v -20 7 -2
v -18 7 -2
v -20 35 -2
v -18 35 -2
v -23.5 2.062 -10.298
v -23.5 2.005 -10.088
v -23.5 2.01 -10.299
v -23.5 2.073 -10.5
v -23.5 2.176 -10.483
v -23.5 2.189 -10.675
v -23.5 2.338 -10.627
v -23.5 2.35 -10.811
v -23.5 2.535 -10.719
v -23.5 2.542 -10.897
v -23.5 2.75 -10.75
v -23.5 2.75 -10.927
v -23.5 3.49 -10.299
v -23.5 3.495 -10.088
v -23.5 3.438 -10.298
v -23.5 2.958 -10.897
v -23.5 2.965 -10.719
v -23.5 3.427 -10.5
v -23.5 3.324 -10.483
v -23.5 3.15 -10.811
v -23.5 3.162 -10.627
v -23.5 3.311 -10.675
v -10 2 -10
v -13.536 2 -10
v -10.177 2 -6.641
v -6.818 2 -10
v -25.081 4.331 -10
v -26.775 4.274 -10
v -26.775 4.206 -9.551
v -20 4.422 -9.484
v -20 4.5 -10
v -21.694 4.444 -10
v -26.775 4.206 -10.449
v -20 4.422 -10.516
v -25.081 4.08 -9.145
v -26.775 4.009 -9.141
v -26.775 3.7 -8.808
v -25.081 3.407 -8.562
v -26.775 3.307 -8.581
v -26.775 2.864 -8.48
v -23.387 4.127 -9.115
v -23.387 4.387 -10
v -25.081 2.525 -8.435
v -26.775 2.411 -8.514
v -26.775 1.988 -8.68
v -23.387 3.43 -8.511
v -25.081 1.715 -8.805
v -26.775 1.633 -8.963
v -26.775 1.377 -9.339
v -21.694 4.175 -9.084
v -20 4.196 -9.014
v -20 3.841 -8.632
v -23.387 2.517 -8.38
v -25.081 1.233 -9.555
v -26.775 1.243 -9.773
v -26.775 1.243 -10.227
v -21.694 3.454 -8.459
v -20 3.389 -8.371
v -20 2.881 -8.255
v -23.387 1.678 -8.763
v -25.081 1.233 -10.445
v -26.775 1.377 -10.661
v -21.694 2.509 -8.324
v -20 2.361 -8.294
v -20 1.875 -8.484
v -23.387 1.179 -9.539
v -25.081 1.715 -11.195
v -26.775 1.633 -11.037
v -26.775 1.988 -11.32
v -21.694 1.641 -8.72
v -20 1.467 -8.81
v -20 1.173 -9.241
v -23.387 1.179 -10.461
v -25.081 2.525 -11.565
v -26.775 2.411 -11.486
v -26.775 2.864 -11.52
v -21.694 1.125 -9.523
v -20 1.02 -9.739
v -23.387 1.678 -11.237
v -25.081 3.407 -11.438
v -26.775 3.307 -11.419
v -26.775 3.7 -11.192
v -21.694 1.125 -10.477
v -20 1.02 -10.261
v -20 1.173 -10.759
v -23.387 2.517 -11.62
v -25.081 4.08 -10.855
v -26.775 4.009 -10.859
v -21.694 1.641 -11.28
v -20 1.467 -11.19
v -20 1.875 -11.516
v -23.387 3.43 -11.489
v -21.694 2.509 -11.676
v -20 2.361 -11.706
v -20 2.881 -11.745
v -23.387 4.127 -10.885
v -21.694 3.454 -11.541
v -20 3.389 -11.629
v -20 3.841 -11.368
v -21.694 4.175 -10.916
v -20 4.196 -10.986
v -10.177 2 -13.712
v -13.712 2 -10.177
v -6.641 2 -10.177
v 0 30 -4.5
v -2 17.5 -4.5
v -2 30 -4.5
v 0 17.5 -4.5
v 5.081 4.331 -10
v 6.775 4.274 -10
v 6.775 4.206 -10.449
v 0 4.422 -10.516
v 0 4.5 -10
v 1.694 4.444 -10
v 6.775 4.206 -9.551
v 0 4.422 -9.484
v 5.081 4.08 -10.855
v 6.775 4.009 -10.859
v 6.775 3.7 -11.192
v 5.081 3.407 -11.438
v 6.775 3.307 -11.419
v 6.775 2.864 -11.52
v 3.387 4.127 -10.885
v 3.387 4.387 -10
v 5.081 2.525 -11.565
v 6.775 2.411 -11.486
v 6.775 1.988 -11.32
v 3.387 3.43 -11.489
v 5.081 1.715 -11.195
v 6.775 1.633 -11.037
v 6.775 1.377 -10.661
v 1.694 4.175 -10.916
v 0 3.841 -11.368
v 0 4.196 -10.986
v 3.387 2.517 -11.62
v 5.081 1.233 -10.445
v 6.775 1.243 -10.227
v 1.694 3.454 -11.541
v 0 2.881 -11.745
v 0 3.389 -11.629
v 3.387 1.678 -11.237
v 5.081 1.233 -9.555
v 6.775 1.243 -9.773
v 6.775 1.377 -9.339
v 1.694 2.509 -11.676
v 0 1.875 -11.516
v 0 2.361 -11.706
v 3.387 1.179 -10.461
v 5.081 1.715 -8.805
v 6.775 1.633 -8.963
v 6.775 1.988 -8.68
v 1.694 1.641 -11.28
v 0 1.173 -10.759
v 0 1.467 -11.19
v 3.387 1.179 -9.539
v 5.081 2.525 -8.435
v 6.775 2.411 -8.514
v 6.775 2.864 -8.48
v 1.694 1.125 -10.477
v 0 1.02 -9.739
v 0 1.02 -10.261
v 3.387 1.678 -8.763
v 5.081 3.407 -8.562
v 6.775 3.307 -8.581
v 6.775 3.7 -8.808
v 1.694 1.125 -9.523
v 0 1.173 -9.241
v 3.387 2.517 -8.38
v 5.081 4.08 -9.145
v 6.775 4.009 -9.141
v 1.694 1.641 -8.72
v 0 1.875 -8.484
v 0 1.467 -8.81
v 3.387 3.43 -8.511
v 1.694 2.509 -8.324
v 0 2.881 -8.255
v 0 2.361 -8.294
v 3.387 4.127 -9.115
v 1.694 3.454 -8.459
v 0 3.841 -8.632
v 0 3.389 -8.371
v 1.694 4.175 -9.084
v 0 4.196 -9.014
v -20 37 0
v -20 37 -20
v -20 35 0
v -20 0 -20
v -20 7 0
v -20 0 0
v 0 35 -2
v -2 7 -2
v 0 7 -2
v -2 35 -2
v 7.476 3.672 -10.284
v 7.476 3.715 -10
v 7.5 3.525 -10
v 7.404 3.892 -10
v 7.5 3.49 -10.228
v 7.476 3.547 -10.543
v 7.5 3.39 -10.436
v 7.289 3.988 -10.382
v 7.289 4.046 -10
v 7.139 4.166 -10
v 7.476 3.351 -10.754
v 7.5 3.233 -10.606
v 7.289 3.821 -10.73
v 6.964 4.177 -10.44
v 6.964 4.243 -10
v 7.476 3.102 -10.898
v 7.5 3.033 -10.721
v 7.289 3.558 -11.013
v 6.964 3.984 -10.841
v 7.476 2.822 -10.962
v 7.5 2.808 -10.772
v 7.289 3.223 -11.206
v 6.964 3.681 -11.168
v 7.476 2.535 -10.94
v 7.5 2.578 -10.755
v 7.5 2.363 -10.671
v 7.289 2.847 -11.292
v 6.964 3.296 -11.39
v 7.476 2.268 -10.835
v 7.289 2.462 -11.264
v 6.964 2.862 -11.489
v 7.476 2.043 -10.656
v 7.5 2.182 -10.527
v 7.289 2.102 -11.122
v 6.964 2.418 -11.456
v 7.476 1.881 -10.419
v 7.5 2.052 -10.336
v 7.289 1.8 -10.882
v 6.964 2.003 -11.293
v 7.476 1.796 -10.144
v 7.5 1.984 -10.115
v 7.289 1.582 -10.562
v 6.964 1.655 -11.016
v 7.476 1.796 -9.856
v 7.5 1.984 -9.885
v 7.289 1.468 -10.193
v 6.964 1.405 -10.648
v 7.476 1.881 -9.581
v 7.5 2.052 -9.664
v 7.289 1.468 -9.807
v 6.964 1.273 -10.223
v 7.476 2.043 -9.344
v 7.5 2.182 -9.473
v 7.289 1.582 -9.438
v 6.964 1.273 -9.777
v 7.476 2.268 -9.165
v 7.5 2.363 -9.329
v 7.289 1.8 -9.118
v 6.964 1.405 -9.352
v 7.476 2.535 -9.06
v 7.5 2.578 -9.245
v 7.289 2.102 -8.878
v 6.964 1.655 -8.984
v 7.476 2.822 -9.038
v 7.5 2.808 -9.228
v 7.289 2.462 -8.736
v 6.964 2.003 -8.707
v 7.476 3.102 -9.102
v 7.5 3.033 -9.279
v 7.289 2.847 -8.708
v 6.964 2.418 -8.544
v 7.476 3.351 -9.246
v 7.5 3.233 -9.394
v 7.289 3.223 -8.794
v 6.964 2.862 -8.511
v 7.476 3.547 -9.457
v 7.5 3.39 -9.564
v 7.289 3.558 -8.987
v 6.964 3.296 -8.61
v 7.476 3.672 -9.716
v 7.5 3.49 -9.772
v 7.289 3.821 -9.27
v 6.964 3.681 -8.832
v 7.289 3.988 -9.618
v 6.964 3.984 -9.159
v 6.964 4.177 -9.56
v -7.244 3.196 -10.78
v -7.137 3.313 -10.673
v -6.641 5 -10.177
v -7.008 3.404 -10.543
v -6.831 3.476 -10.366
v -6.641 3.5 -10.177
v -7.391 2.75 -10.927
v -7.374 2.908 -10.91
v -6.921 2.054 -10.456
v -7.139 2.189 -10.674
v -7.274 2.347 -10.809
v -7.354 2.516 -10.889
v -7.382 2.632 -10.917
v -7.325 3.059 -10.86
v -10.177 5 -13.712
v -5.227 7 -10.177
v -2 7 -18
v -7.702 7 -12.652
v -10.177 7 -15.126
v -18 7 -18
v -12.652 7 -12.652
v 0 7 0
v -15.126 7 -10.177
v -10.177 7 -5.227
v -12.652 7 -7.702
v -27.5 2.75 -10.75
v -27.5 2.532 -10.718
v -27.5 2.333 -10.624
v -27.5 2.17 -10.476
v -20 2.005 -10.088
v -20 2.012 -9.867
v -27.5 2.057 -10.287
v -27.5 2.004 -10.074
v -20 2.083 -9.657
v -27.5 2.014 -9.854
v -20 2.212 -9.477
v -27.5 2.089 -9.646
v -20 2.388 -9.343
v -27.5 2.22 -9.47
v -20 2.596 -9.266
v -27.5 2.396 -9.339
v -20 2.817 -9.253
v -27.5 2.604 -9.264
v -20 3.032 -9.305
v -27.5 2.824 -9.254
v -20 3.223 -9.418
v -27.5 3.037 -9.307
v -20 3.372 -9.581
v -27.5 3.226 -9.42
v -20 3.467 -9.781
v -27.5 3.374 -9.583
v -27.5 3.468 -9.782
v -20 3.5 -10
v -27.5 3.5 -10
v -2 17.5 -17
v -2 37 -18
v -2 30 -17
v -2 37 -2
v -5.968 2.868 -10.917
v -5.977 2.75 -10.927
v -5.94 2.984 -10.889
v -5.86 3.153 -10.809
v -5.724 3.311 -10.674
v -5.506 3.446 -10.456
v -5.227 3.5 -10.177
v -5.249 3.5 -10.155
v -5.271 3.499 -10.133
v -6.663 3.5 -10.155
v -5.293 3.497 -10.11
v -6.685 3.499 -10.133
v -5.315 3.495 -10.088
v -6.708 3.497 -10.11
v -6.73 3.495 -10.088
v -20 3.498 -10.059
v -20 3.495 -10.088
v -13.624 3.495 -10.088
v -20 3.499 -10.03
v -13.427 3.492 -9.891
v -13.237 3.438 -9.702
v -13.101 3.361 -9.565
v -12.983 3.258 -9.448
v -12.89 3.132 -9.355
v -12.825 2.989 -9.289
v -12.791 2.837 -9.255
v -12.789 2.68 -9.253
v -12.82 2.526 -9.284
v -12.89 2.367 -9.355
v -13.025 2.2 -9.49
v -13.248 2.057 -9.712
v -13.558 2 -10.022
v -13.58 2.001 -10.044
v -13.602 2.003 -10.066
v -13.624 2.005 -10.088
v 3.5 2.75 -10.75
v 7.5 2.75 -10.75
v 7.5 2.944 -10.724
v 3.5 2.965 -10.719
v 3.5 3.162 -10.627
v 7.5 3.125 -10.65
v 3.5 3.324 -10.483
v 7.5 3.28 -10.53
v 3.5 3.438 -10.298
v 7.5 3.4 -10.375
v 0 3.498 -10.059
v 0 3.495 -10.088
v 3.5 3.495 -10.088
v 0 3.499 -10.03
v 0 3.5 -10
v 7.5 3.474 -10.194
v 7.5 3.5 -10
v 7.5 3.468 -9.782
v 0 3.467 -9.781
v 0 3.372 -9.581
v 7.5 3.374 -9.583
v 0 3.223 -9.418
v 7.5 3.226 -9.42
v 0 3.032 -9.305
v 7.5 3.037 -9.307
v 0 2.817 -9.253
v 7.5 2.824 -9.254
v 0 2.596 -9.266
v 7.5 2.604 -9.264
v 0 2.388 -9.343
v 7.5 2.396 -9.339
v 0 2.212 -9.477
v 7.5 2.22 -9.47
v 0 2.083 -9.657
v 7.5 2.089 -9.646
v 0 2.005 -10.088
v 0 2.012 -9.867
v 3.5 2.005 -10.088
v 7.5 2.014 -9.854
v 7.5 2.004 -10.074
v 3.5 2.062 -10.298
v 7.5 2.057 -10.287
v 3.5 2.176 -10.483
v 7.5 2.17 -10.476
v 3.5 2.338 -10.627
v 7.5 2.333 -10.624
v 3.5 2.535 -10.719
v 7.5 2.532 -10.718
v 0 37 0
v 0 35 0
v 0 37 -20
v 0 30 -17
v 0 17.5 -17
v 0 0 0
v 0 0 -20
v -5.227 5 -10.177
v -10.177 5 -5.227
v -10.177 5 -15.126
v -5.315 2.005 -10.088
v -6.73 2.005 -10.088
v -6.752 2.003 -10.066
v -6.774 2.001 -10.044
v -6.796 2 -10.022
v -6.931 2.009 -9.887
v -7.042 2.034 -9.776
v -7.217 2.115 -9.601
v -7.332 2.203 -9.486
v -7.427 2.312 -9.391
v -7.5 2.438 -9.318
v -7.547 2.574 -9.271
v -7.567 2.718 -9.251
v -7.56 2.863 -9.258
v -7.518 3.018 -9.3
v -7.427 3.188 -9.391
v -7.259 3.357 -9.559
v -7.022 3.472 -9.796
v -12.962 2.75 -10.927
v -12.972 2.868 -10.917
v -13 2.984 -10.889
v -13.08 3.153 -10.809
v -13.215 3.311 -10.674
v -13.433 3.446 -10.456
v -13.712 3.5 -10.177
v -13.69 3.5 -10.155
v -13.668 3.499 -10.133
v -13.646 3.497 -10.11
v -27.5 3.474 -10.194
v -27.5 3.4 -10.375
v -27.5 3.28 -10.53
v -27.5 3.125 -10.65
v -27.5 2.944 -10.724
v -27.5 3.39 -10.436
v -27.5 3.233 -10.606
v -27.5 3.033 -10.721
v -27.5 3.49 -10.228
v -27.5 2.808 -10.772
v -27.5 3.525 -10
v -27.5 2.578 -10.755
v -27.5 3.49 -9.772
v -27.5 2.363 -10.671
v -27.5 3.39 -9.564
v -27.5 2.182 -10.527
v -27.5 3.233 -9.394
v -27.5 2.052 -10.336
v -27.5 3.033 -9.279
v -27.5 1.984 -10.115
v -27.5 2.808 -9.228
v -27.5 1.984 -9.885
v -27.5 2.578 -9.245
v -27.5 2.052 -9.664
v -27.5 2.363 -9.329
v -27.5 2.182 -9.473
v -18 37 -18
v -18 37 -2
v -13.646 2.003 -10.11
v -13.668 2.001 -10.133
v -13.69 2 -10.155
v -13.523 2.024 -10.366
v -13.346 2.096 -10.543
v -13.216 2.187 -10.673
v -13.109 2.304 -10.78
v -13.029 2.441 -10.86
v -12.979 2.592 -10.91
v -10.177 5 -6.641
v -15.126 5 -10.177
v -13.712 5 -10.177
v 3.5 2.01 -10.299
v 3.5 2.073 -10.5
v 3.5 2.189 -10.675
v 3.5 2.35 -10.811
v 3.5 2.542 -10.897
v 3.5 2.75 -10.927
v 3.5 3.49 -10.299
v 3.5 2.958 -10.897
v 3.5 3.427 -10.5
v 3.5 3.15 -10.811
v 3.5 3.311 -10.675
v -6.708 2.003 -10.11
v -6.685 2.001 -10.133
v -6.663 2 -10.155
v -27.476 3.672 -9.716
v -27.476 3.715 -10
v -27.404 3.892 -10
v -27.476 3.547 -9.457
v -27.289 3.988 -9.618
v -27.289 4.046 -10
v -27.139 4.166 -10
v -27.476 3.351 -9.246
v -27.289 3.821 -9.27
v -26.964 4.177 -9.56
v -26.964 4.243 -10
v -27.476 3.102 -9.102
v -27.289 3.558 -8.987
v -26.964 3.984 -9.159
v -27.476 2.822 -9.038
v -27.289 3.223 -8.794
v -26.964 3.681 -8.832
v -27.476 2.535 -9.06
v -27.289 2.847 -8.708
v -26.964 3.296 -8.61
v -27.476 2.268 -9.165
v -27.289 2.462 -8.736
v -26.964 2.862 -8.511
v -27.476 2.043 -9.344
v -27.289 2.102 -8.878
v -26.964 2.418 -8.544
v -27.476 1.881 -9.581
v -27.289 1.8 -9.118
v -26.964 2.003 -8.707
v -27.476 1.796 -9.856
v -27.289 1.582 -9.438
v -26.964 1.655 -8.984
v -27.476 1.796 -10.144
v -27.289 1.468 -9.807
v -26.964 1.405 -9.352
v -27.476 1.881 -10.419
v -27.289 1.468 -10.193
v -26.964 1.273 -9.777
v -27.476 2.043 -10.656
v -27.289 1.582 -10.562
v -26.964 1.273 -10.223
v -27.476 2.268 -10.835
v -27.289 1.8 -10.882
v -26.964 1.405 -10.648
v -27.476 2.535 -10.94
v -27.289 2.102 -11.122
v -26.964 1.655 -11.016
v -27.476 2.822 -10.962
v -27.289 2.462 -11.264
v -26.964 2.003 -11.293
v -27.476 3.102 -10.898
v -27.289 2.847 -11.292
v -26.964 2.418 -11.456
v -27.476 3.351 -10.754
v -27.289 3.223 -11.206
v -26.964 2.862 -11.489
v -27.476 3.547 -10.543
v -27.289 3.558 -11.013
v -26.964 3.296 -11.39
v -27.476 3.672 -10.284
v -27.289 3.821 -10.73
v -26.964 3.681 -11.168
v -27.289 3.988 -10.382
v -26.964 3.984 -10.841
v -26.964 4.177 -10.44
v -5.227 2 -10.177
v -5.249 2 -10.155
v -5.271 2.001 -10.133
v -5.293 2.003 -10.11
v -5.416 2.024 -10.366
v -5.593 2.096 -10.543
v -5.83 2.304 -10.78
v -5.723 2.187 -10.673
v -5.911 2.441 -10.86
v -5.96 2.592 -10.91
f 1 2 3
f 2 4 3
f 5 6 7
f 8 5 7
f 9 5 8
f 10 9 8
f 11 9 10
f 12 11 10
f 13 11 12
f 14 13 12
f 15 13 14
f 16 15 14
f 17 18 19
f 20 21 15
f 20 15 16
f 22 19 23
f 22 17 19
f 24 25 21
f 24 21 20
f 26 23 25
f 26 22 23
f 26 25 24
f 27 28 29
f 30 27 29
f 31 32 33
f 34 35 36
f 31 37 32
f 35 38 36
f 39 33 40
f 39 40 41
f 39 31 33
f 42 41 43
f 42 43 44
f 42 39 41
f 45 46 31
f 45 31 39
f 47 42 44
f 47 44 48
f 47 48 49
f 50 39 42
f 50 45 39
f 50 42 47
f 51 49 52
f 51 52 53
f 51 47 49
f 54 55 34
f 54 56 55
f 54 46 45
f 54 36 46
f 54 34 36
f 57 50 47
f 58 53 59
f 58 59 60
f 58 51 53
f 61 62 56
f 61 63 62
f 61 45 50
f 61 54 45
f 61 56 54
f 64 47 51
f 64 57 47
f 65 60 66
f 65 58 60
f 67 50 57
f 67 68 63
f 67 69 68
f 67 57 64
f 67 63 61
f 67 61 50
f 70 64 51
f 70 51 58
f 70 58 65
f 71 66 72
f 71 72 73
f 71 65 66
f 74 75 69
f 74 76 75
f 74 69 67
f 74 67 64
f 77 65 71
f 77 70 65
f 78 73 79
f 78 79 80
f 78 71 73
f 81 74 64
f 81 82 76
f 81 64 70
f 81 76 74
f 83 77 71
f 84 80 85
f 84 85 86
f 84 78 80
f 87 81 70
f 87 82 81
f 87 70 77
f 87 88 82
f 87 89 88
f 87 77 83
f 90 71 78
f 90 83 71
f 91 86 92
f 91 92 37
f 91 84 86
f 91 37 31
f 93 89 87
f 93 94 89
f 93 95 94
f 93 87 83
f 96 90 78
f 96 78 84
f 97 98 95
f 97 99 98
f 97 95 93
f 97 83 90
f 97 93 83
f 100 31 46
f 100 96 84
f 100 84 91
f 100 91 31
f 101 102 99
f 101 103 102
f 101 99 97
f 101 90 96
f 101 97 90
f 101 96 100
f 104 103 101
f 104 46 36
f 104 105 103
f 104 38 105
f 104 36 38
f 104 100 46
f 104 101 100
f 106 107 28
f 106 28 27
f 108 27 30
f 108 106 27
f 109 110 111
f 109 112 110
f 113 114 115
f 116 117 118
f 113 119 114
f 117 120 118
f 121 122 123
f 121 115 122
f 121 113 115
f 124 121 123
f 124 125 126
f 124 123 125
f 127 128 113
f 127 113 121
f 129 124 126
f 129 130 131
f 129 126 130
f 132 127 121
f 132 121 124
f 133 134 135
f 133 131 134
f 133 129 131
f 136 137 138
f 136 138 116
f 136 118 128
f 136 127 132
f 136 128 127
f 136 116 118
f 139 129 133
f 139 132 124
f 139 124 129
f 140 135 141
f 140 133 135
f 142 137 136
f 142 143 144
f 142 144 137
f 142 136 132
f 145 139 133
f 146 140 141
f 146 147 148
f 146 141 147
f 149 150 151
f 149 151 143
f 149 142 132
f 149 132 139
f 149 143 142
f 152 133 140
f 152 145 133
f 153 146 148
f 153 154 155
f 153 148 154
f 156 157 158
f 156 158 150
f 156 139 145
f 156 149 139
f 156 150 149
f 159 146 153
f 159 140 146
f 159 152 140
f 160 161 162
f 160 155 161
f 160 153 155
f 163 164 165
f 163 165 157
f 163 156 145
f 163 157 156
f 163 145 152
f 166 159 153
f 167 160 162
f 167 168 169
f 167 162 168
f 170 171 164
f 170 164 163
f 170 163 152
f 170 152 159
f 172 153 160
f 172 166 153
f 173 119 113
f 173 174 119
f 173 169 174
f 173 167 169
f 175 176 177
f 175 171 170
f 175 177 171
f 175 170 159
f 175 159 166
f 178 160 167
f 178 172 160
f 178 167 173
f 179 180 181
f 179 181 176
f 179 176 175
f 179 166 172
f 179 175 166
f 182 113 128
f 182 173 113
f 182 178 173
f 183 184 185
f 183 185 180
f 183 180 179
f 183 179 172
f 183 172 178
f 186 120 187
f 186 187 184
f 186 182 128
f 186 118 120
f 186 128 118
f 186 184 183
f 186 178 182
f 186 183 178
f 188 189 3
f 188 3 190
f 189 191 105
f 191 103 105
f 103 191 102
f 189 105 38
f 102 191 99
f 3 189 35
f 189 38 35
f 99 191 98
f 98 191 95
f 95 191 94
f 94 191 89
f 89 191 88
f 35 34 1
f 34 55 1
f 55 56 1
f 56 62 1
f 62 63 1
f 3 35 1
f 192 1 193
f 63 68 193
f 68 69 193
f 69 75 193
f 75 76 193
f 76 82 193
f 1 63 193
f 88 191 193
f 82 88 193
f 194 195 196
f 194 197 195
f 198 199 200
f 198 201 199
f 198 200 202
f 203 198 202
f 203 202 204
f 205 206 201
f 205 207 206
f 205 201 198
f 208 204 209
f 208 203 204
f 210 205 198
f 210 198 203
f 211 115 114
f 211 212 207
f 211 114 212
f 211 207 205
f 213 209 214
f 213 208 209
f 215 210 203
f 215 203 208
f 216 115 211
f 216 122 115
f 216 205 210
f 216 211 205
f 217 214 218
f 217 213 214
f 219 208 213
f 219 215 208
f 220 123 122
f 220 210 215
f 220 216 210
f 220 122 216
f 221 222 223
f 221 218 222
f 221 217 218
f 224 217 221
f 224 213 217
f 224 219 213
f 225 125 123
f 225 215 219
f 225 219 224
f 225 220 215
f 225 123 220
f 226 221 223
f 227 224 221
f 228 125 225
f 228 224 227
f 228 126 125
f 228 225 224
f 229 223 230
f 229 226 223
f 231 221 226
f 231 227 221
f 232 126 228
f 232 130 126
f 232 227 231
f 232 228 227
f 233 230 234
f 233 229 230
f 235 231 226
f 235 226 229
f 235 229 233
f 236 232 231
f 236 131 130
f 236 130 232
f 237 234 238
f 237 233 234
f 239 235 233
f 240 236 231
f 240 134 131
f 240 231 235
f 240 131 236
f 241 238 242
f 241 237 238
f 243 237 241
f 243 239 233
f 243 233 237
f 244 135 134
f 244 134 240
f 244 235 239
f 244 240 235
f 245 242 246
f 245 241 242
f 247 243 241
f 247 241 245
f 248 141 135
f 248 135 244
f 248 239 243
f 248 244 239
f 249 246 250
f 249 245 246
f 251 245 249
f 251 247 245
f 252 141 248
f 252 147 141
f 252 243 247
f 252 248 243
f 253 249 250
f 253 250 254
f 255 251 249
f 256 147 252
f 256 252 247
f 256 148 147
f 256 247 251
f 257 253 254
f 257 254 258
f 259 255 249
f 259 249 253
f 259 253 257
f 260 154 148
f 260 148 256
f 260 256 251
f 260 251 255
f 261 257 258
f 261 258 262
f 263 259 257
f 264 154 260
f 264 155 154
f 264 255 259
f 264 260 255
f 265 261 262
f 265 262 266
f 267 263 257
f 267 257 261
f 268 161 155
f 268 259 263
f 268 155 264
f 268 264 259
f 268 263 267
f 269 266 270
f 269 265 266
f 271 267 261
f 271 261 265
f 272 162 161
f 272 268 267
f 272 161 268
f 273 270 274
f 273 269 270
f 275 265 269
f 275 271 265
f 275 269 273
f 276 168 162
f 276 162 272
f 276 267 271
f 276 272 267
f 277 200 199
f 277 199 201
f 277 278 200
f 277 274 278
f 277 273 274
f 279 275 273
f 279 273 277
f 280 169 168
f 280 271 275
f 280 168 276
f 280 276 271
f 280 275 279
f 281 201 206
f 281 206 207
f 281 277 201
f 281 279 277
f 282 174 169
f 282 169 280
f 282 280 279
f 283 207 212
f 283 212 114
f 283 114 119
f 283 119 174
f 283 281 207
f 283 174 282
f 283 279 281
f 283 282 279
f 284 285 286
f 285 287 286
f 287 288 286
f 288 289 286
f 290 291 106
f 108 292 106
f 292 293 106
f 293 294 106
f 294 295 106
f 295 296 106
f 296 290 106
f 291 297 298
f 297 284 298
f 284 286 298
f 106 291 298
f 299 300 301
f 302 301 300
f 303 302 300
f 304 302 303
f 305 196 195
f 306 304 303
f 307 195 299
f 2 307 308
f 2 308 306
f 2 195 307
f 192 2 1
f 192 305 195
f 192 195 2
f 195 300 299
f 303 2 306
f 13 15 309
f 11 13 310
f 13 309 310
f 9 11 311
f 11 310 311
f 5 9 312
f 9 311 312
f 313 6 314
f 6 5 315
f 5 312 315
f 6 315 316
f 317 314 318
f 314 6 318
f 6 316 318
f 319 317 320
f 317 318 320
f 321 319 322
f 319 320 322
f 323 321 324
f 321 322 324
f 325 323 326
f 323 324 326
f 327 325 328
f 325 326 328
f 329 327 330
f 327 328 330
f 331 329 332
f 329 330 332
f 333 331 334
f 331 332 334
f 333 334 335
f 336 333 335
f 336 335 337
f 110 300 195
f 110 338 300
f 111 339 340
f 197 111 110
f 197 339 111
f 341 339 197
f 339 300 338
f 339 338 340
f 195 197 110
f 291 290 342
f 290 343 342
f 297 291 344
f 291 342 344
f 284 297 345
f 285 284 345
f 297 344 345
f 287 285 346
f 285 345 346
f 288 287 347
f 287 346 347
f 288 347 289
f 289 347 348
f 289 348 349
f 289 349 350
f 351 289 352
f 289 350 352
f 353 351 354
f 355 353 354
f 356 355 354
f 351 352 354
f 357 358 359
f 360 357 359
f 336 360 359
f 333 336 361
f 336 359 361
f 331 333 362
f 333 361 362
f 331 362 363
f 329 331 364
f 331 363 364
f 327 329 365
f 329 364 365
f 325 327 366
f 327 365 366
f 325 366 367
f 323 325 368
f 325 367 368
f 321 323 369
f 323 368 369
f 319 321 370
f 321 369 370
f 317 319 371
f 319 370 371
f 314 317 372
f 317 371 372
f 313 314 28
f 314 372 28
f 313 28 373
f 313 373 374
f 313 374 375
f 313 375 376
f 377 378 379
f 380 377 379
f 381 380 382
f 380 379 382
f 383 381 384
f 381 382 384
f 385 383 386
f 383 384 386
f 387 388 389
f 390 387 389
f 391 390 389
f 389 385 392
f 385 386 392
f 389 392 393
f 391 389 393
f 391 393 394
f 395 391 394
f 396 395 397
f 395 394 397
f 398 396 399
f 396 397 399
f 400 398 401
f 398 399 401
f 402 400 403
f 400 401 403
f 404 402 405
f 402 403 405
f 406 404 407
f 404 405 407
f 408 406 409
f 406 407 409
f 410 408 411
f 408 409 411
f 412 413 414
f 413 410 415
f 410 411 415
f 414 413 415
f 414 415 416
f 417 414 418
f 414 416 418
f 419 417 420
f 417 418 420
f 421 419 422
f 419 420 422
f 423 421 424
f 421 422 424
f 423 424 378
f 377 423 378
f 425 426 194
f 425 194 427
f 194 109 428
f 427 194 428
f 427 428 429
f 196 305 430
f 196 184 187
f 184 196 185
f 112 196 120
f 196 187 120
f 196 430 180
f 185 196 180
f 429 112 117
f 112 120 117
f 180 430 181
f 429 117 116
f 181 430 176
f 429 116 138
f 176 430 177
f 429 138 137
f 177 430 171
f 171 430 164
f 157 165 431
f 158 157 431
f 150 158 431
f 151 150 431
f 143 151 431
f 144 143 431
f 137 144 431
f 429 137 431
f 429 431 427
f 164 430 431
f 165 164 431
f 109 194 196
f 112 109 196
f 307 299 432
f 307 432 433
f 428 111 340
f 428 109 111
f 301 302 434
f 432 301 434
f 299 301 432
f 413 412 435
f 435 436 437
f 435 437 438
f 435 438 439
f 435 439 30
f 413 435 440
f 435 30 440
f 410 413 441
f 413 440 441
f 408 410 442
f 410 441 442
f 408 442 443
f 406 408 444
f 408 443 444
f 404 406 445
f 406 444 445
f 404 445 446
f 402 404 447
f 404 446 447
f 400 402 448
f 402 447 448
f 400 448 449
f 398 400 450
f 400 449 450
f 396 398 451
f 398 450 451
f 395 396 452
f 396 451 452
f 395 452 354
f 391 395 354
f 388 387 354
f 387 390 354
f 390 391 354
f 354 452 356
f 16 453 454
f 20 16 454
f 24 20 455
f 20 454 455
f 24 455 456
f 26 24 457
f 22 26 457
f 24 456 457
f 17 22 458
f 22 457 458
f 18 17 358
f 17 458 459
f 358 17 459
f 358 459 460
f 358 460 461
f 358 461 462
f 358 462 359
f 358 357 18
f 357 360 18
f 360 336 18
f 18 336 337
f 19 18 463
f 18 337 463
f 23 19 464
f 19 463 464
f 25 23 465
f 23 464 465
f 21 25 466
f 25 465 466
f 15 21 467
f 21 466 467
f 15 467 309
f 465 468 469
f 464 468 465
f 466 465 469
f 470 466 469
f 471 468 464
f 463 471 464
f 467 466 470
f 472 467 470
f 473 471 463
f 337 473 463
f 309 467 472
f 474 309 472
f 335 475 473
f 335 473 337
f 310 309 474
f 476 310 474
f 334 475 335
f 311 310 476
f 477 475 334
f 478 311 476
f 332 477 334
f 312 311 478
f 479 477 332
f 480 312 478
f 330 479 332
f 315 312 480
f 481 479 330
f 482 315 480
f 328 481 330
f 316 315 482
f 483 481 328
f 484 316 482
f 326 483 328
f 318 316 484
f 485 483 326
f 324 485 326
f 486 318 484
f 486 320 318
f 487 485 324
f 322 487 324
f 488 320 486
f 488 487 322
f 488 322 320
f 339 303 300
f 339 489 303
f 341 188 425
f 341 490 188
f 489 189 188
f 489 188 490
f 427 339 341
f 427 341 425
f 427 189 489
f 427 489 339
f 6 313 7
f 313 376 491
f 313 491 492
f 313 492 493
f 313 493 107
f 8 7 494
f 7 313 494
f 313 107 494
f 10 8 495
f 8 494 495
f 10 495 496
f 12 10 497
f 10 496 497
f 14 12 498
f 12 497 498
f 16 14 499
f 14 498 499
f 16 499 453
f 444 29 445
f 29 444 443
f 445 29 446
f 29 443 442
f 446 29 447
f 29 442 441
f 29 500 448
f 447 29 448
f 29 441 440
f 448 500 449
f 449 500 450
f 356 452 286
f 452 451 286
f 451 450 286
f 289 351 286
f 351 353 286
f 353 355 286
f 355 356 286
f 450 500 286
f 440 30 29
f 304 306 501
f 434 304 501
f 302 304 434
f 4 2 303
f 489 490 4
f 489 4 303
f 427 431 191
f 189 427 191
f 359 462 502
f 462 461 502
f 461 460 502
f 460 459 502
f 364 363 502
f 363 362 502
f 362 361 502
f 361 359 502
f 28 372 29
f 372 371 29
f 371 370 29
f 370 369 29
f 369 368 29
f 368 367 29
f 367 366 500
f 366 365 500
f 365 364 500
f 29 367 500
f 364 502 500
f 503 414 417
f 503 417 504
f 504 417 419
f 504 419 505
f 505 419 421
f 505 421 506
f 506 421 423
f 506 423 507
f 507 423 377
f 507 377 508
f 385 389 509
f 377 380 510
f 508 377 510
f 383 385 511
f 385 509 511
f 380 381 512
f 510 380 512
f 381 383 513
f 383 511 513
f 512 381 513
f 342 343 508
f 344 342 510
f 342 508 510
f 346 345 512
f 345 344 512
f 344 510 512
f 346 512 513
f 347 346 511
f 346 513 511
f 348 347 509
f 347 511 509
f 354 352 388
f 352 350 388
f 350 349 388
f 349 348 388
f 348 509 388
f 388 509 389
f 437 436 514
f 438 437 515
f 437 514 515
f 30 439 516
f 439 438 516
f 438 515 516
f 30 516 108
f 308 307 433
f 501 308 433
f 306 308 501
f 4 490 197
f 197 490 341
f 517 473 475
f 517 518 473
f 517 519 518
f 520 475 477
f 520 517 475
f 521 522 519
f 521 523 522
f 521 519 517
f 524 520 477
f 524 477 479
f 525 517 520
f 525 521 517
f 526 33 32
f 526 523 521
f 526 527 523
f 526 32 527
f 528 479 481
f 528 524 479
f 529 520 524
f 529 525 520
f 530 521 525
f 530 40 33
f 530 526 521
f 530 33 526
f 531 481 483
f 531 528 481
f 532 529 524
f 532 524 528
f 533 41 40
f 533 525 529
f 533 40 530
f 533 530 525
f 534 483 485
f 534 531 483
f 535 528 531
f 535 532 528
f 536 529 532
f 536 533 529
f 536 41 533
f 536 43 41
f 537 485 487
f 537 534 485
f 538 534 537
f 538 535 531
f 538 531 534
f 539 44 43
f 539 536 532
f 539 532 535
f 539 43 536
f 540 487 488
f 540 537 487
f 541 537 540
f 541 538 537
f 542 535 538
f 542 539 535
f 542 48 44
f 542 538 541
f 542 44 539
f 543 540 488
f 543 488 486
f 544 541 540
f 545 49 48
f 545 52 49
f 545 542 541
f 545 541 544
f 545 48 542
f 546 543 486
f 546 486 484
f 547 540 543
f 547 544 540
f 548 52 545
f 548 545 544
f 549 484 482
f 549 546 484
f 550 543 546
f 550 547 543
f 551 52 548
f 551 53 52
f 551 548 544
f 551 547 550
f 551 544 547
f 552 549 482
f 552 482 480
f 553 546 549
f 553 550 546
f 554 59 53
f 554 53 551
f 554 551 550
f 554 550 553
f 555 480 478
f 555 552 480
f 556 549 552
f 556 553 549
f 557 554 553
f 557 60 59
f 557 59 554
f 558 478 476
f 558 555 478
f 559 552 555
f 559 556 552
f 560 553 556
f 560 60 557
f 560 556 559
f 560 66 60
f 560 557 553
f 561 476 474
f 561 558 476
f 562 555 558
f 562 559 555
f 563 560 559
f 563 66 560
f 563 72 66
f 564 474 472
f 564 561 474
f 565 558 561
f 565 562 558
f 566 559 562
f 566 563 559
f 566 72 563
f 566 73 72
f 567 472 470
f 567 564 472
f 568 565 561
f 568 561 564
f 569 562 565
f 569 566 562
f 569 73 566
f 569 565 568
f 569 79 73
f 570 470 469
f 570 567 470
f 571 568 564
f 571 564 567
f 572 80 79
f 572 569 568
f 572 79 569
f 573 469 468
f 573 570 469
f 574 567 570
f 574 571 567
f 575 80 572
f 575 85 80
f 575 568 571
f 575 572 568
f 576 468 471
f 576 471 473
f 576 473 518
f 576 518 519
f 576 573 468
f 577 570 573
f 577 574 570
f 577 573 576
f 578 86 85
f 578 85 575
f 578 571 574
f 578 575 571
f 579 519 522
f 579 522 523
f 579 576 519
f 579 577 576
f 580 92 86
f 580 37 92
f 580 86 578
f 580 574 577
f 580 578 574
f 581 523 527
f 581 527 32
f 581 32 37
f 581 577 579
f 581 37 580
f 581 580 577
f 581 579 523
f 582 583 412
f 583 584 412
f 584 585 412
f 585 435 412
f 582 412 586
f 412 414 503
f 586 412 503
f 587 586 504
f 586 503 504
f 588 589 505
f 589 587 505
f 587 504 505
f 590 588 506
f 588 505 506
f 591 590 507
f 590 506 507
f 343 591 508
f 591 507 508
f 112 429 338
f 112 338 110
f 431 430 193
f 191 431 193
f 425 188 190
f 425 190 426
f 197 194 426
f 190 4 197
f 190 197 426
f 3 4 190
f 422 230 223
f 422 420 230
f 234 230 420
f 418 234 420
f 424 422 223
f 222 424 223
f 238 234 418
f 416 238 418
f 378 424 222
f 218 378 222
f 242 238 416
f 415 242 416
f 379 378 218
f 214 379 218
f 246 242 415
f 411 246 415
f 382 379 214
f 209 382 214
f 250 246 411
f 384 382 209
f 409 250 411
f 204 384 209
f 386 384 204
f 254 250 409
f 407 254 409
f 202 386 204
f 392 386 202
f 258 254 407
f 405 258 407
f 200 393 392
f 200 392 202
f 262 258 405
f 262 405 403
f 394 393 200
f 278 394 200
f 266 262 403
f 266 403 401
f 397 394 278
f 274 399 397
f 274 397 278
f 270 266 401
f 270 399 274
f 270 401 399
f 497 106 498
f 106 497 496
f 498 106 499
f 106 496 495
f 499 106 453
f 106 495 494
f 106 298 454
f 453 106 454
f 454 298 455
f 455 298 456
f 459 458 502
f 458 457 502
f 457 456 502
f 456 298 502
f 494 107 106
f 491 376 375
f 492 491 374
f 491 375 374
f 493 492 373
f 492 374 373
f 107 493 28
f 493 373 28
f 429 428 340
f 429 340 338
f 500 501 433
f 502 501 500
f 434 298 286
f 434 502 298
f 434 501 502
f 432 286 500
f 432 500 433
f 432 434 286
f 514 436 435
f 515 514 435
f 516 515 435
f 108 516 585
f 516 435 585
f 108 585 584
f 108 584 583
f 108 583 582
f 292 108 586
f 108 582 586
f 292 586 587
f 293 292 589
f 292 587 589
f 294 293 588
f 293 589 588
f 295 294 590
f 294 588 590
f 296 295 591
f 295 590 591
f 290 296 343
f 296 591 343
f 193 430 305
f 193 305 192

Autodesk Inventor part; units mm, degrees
ref_plane "YZ Plane" through (0, 0, 0) normal (1, 0, 0) x (0, 1, 0)
sketch "Sketch1" plane through (0, 0, 0) normal (0, 1, 0) x (-1, 0, 0)
  line L0 (0, 0) -> (20, 0)
  line L1 (20, 0) -> (20, -20)
  line L2 (20, -20) -> (0, -20)
  line L3 (0, -20) -> (0, 0)
  dimension "d0" = 20
  dimension "d1" = 20
extrude "Extrusion1" add sketch "Sketch1" along normal blind 10
sketch "Sketch4" plane through (0, 10, 0) normal (0, 1, 0) x (1, 0, 0)
  line L0 (0, 20) -> (-20, 20) projected
  line L1 (-20, 20) -> (-20, 0) projected
  line L2 (-20, 0) -> (0, 0) projected
  line L3 (0, 0) -> (0, 20) projected
  line L4 (0, 20) -> (-20, 20) projected
  line L5 (-20, 20) -> (0, 0)
  line L6 (-10.1768, 10.1768) -> (-7.7019, 12.6517)
  line L7 (-7.7019, 12.6517) -> (-5.227, 10.1768)
  line L8 (-5.227, 10.1768) -> (-7.7019, 7.7019)
  line L9 (-7.7019, 7.7019) -> (-10.1768, 10.1768)
  line L10 (-10.1768, 10.1768) -> (-12.6517, 7.7019)
  line L11 (-12.6517, 7.7019) -> (-15.1265, 10.1768)
  line L12 (-15.1265, 10.1768) -> (-12.6517, 12.6517)
  line L13 (-12.6517, 12.6517) -> (-10.1768, 10.1768)
  line L14 (-12.6517, 12.6517) -> (-10.1768, 15.1265)
  line L15 (-10.1768, 15.1265) -> (-7.7019, 12.6517)
  line L16 (-7.7019, 12.6517) -> (-10.1768, 10.1768)
  line L17 (-10.1768, 10.1768) -> (-12.6517, 12.6517)
  line L18 (-12.6517, 7.7019) -> (-10.1768, 10.1768)
  line L19 (-10.1768, 10.1768) -> (-7.7019, 7.7019)
  line L20 (-7.7019, 7.7019) -> (-10.1768, 5.227)
  line L21 (-10.1768, 5.227) -> (-12.6517, 7.7019)
  dimension "d10" = 3.5
  dimension "d11" = 3.5
  dimension "d12" = 3.5
  dimension "d13" = 3.5
extrude "Extrusion3" cut sketch "Sketch4" against normal blind 8 contours L14 L15 L6 L5 | L5 L10 L11 L12 | L20 L21 L10 L5 | L5 L6 L7 L8
sketch "Sketch5" plane through (0, 10, 0) normal (0, 1, 0) x (1, 0, 0)
  line L0 (-5.227, 10.1768) -> (-10.1768, 5.227) projected
  line L1 (-10.1768, 5.227) -> (-15.1265, 10.1768) projected
  line L2 (-15.1265, 10.1768) -> (-10.1768, 15.1265) projected
  line L3 (-10.1768, 15.1265) -> (-5.227, 10.1768) projected
  line L4 (0, 20) -> (-20, 20) projected
  line L5 (-20, 20) -> (-20, 0) projected
  line L6 (-20, 0) -> (0, 0) projected
  line L7 (0, 0) -> (0, 20) projected
  line L8 (-18, 18) -> (-2, 18)
  line L9 (-2, 18) -> (-2, 2)
  line L10 (-2, 2) -> (-18, 2)
  line L11 (-18, 2) -> (-18, 18)
  line L12 (-18, 2) -> (-18, 0)
  line L13 (-2, 2) -> (-2, 0)
  line L14 (-20, 0) -> (0, 0) projected
  line L15 (-18, 2) -> (-20, 2)
  line L16 (-20, 20) -> (-20, 0) projected
  line L17 (-2, 2) -> (0, 2)
  line L18 (0, 0) -> (0, 20) projected
  point P0 (0, 2)
  dimension "d16" = 2
extrude "Extrusion4" add sketch "Sketch5" along normal blind 27 contours L7 L17 L9 L8 L11 L15 L5 L4
ref_plane "Work Plane1" through (-10, 10, -2) normal (1, 0, 0) x (0, 0, -1)
sketch "Sketch6" plane through (-10, 10, -2) normal (1, 0, 0) x (0, 0, -1)
  line L0 (3.227, 0) -> (8.1768, 0) projected
  line L1 (3.227, 0) -> (3.227, -8) projected
  line L2 (3.227, -8) -> (8.1768, -8) projected
  line L3 (8.1768, 0) -> (8.1768, -8) projected
  line L4 (8.1768, 0) -> (13.1265, 0) projected
  line L5 (8.1768, 0) -> (8.1768, -8) projected
  line L6 (8.1768, -8) -> (13.1265, -8) projected
  line L7 (13.1265, 0) -> (13.1265, -8) projected
  line L8 (16, 0) -> (0, 0) projected
  line L9 (16, 0) -> (16, 27) projected
  line L10 (0, 27) -> (16, 27) projected
  line L11 (0, 0) -> (0, 27) projected
  line L12 (8.1768, 0) -> (8.1768, -8) projected
  line L13 (8.1768, -8) -> (8.1768, -7.25)
  circle A0 centre (8.1768, -7.25) radius 0.75
  point P0 (-2, -10)
  dimension "d20" = 0.75
  dimension "d21" = 1.5
extrude "Extrusion5" cut sketch "Sketch6" along normal mid plane 27 contours A0 L3 | L3 A0
ref_plane "Work Plane2" through (-20, 0, -10) normal (0, 0, 1) x (1, 0, 0)
sketch "Sketch7" plane through (-20, 0, -10) normal (0, 0, 1) x (1, 0, 0)
  line L0 (20, 0) -> (0, 0) projected
  line L1 (0, 0) -> (0, 37) projected
  line L2 (20, 37) -> (0, 37) projected
  line L3 (20, 0) -> (20, 37) projected
  arc A0 (14.773, 3.5) -> (14.773, 2) centre (14.773, 2.75) ccw projected
  arc A1 (14.773, 3.5) -> (14.773, 2) centre (14.773, 2.75) ccw projected
  line L4 (20, 3.5) -> (20, 2) projected
  line L5 (20, 3.5) -> (27.5, 3.5)
  line L6 (27.5, 3.5) -> (27.5, 2)
  line L7 (27.5, 2) -> (20, 2)
  line L8 (20, 2) -> (20, 3.5)
  line L9 (20, 3.5) -> (20, 4.5)
  line L10 (20, 0) -> (20, 37) projected
  line L11 (27.5, 3.5) -> (27.5, 3.5246)
  line L12 (26.775, 4.2742) -> (20, 4.5)
  arc A2 (27.5, 3.5246) -> (26.775, 4.2742) centre (26.75, 3.5246) ccw
  line L13 (20, 3.5) -> (20, 2) projected
  line L14 (20, 2.75) -> (27.5, 2.75)
  point P0 (27.5, 4.25)
  dimension "d25" = 7.5
  dimension "d26" = 1
  dimension "d27" = 0.75
  dimension "d28" = 0.75
revolve "Revolution1" add sketch "Sketch7" angle 360 about axis through (0, 2.75, -10) along (1, 0, 0) contours L3 L12 A2 L11 L5
mirror "Mirror1" about plane through (-10, 10, -2) normal (1, 0, 0) of "Revolution1"
sketch "Sketch8" plane through (-20, 10, -2) normal (0, 0, 1) x (1, 0, 0)
  line L0 (2, 0) -> (0, 0) projected
  line L1 (2, 0) -> (2, 27) projected
  line L2 (0, 27) -> (2, 27) projected
  line L3 (0, 0) -> (0, 27) projected
  line L4 (20, 0) -> (18, 0) projected
  line L5 (20, 0) -> (20, 27) projected
  line L6 (18, 27) -> (20, 27) projected
  line L7 (18, 0) -> (18, 27) projected
  line L8 (20, 27) -> (0, 27) projected
  line L9 (0, 27) -> (20, 27)
  line L10 (20, 27) -> (20, 25)
  line L11 (20, 25) -> (0, 25)
  line L12 (0, 25) -> (0, 27)
  point P0 (20, -10)
  point P1 (0, 25)
  dimension "d30" = 20
  dimension "d31" = 2
extrude "Extrusion6" add sketch "Sketch8" along normal blind 2 contours L11 L3 L2 L1 | L1 L8 L7 L11 | L7 L6 L5 L11
ref_plane "Work Plane3" through (0, 8, 0) normal (0, 1, 0) x (1, 0, 0)
sketch "Sketch9" plane through (0, 8, 0) normal (0, 1, 0) x (1, 0, 0)
  line L0 (-10.1768, 15.1265) -> (-5.227, 10.1768) projected
  line L1 (-15.1265, 10.1768) -> (-10.1768, 15.1265) projected
  line L2 (-10.1768, 5.227) -> (-15.1265, 10.1768) projected
  line L3 (-5.227, 10.1768) -> (-10.1768, 5.227) projected
  line L4 (-6.6412, 10.1768) -> (-10.1768, 13.7123)
  line L5 (-10.1768, 13.7123) -> (-13.7123, 10.1768)
  line L6 (-13.7123, 10.1768) -> (-10.1768, 6.6412)
  line L7 (-10.1768, 6.6412) -> (-6.6412, 10.1768)
  point P0 (0, 0)
  dimension "d35" = 1
extrude "Extrusion7" add sketch "Sketch9" against normal blind 6
extrude "Extrusion8" cut sketch "Sketch6" along normal mid plane 27 contours A0 L3 | L3 A0
sketch "Sketch10" plane through (0, 0, 0) normal (1, 0, 0) x (0, 0, -1)
  line L0 (0, 0) -> (20, 0) projected
  line L1 (20, 0) -> (20, 37) projected
  line L2 (20, 37) -> (0, 37) projected
  line L3 (0, 35) -> (0, 37) projected
  line L4 (2, 35) -> (0, 35) projected
  line L5 (2, 10) -> (2, 35) projected
  line L6 (0, 10) -> (2, 10) projected
  line L7 (0, 0) -> (0, 10) projected
  circle A0 centre (10, 2.75) radius 1.75 projected
  line L8 (2, 35) -> (10, 35)
  line L9 (10, 35) -> (4.5, 35)
  line L10 (4.5, 35) -> (4.5, 30)
  line L11 (4.5, 30) -> (17, 30)
  line L12 (17, 30) -> (17, 17.5)
  line L13 (17, 17.5) -> (4.5, 17.5)
  line L14 (4.5, 17.5) -> (4.5, 30)
  dimension "d40" = 5.5
  dimension "d41" = 5
  dimension "d42" = 12.5
  dimension "d43" = 12.5
  dimension "d44" = 8
extrude "Extrusion9" cut sketch "Sketch10" against normal blind 6 contours L11 L12 L13 L14
move faces "Move1" translate (0, -3, 0) faces at (-8.5269, 8, -13.0052)
move faces "Move3" translate (0, -3, 0) faces at (-5.8013, 10, -5.8013)
sketch "Sketch12" plane through (-10, 10, -2) normal (1, 0, 0) x (0, 0, -1)
  circle A0 centre (8, -7.25) radius 0.75 projected
  point P0 (-2, -10)
extrude "Extrusion10" cut sketch "Sketch12" along normal mid plane 100
sketch "Sketch13" plane through (0, 0, 0) normal (1, 0, 0) x (0, 0, -1)
  arc A0 (10.0884, 3.4948) -> (10, 2) centre (10, 2.75) ccw projected
  circle A1 centre (10, 2.75) radius 1.75
  point P0 (0, 0)
  dimension "d58" = 3.5
properties part number "latticeChamberv6b"
